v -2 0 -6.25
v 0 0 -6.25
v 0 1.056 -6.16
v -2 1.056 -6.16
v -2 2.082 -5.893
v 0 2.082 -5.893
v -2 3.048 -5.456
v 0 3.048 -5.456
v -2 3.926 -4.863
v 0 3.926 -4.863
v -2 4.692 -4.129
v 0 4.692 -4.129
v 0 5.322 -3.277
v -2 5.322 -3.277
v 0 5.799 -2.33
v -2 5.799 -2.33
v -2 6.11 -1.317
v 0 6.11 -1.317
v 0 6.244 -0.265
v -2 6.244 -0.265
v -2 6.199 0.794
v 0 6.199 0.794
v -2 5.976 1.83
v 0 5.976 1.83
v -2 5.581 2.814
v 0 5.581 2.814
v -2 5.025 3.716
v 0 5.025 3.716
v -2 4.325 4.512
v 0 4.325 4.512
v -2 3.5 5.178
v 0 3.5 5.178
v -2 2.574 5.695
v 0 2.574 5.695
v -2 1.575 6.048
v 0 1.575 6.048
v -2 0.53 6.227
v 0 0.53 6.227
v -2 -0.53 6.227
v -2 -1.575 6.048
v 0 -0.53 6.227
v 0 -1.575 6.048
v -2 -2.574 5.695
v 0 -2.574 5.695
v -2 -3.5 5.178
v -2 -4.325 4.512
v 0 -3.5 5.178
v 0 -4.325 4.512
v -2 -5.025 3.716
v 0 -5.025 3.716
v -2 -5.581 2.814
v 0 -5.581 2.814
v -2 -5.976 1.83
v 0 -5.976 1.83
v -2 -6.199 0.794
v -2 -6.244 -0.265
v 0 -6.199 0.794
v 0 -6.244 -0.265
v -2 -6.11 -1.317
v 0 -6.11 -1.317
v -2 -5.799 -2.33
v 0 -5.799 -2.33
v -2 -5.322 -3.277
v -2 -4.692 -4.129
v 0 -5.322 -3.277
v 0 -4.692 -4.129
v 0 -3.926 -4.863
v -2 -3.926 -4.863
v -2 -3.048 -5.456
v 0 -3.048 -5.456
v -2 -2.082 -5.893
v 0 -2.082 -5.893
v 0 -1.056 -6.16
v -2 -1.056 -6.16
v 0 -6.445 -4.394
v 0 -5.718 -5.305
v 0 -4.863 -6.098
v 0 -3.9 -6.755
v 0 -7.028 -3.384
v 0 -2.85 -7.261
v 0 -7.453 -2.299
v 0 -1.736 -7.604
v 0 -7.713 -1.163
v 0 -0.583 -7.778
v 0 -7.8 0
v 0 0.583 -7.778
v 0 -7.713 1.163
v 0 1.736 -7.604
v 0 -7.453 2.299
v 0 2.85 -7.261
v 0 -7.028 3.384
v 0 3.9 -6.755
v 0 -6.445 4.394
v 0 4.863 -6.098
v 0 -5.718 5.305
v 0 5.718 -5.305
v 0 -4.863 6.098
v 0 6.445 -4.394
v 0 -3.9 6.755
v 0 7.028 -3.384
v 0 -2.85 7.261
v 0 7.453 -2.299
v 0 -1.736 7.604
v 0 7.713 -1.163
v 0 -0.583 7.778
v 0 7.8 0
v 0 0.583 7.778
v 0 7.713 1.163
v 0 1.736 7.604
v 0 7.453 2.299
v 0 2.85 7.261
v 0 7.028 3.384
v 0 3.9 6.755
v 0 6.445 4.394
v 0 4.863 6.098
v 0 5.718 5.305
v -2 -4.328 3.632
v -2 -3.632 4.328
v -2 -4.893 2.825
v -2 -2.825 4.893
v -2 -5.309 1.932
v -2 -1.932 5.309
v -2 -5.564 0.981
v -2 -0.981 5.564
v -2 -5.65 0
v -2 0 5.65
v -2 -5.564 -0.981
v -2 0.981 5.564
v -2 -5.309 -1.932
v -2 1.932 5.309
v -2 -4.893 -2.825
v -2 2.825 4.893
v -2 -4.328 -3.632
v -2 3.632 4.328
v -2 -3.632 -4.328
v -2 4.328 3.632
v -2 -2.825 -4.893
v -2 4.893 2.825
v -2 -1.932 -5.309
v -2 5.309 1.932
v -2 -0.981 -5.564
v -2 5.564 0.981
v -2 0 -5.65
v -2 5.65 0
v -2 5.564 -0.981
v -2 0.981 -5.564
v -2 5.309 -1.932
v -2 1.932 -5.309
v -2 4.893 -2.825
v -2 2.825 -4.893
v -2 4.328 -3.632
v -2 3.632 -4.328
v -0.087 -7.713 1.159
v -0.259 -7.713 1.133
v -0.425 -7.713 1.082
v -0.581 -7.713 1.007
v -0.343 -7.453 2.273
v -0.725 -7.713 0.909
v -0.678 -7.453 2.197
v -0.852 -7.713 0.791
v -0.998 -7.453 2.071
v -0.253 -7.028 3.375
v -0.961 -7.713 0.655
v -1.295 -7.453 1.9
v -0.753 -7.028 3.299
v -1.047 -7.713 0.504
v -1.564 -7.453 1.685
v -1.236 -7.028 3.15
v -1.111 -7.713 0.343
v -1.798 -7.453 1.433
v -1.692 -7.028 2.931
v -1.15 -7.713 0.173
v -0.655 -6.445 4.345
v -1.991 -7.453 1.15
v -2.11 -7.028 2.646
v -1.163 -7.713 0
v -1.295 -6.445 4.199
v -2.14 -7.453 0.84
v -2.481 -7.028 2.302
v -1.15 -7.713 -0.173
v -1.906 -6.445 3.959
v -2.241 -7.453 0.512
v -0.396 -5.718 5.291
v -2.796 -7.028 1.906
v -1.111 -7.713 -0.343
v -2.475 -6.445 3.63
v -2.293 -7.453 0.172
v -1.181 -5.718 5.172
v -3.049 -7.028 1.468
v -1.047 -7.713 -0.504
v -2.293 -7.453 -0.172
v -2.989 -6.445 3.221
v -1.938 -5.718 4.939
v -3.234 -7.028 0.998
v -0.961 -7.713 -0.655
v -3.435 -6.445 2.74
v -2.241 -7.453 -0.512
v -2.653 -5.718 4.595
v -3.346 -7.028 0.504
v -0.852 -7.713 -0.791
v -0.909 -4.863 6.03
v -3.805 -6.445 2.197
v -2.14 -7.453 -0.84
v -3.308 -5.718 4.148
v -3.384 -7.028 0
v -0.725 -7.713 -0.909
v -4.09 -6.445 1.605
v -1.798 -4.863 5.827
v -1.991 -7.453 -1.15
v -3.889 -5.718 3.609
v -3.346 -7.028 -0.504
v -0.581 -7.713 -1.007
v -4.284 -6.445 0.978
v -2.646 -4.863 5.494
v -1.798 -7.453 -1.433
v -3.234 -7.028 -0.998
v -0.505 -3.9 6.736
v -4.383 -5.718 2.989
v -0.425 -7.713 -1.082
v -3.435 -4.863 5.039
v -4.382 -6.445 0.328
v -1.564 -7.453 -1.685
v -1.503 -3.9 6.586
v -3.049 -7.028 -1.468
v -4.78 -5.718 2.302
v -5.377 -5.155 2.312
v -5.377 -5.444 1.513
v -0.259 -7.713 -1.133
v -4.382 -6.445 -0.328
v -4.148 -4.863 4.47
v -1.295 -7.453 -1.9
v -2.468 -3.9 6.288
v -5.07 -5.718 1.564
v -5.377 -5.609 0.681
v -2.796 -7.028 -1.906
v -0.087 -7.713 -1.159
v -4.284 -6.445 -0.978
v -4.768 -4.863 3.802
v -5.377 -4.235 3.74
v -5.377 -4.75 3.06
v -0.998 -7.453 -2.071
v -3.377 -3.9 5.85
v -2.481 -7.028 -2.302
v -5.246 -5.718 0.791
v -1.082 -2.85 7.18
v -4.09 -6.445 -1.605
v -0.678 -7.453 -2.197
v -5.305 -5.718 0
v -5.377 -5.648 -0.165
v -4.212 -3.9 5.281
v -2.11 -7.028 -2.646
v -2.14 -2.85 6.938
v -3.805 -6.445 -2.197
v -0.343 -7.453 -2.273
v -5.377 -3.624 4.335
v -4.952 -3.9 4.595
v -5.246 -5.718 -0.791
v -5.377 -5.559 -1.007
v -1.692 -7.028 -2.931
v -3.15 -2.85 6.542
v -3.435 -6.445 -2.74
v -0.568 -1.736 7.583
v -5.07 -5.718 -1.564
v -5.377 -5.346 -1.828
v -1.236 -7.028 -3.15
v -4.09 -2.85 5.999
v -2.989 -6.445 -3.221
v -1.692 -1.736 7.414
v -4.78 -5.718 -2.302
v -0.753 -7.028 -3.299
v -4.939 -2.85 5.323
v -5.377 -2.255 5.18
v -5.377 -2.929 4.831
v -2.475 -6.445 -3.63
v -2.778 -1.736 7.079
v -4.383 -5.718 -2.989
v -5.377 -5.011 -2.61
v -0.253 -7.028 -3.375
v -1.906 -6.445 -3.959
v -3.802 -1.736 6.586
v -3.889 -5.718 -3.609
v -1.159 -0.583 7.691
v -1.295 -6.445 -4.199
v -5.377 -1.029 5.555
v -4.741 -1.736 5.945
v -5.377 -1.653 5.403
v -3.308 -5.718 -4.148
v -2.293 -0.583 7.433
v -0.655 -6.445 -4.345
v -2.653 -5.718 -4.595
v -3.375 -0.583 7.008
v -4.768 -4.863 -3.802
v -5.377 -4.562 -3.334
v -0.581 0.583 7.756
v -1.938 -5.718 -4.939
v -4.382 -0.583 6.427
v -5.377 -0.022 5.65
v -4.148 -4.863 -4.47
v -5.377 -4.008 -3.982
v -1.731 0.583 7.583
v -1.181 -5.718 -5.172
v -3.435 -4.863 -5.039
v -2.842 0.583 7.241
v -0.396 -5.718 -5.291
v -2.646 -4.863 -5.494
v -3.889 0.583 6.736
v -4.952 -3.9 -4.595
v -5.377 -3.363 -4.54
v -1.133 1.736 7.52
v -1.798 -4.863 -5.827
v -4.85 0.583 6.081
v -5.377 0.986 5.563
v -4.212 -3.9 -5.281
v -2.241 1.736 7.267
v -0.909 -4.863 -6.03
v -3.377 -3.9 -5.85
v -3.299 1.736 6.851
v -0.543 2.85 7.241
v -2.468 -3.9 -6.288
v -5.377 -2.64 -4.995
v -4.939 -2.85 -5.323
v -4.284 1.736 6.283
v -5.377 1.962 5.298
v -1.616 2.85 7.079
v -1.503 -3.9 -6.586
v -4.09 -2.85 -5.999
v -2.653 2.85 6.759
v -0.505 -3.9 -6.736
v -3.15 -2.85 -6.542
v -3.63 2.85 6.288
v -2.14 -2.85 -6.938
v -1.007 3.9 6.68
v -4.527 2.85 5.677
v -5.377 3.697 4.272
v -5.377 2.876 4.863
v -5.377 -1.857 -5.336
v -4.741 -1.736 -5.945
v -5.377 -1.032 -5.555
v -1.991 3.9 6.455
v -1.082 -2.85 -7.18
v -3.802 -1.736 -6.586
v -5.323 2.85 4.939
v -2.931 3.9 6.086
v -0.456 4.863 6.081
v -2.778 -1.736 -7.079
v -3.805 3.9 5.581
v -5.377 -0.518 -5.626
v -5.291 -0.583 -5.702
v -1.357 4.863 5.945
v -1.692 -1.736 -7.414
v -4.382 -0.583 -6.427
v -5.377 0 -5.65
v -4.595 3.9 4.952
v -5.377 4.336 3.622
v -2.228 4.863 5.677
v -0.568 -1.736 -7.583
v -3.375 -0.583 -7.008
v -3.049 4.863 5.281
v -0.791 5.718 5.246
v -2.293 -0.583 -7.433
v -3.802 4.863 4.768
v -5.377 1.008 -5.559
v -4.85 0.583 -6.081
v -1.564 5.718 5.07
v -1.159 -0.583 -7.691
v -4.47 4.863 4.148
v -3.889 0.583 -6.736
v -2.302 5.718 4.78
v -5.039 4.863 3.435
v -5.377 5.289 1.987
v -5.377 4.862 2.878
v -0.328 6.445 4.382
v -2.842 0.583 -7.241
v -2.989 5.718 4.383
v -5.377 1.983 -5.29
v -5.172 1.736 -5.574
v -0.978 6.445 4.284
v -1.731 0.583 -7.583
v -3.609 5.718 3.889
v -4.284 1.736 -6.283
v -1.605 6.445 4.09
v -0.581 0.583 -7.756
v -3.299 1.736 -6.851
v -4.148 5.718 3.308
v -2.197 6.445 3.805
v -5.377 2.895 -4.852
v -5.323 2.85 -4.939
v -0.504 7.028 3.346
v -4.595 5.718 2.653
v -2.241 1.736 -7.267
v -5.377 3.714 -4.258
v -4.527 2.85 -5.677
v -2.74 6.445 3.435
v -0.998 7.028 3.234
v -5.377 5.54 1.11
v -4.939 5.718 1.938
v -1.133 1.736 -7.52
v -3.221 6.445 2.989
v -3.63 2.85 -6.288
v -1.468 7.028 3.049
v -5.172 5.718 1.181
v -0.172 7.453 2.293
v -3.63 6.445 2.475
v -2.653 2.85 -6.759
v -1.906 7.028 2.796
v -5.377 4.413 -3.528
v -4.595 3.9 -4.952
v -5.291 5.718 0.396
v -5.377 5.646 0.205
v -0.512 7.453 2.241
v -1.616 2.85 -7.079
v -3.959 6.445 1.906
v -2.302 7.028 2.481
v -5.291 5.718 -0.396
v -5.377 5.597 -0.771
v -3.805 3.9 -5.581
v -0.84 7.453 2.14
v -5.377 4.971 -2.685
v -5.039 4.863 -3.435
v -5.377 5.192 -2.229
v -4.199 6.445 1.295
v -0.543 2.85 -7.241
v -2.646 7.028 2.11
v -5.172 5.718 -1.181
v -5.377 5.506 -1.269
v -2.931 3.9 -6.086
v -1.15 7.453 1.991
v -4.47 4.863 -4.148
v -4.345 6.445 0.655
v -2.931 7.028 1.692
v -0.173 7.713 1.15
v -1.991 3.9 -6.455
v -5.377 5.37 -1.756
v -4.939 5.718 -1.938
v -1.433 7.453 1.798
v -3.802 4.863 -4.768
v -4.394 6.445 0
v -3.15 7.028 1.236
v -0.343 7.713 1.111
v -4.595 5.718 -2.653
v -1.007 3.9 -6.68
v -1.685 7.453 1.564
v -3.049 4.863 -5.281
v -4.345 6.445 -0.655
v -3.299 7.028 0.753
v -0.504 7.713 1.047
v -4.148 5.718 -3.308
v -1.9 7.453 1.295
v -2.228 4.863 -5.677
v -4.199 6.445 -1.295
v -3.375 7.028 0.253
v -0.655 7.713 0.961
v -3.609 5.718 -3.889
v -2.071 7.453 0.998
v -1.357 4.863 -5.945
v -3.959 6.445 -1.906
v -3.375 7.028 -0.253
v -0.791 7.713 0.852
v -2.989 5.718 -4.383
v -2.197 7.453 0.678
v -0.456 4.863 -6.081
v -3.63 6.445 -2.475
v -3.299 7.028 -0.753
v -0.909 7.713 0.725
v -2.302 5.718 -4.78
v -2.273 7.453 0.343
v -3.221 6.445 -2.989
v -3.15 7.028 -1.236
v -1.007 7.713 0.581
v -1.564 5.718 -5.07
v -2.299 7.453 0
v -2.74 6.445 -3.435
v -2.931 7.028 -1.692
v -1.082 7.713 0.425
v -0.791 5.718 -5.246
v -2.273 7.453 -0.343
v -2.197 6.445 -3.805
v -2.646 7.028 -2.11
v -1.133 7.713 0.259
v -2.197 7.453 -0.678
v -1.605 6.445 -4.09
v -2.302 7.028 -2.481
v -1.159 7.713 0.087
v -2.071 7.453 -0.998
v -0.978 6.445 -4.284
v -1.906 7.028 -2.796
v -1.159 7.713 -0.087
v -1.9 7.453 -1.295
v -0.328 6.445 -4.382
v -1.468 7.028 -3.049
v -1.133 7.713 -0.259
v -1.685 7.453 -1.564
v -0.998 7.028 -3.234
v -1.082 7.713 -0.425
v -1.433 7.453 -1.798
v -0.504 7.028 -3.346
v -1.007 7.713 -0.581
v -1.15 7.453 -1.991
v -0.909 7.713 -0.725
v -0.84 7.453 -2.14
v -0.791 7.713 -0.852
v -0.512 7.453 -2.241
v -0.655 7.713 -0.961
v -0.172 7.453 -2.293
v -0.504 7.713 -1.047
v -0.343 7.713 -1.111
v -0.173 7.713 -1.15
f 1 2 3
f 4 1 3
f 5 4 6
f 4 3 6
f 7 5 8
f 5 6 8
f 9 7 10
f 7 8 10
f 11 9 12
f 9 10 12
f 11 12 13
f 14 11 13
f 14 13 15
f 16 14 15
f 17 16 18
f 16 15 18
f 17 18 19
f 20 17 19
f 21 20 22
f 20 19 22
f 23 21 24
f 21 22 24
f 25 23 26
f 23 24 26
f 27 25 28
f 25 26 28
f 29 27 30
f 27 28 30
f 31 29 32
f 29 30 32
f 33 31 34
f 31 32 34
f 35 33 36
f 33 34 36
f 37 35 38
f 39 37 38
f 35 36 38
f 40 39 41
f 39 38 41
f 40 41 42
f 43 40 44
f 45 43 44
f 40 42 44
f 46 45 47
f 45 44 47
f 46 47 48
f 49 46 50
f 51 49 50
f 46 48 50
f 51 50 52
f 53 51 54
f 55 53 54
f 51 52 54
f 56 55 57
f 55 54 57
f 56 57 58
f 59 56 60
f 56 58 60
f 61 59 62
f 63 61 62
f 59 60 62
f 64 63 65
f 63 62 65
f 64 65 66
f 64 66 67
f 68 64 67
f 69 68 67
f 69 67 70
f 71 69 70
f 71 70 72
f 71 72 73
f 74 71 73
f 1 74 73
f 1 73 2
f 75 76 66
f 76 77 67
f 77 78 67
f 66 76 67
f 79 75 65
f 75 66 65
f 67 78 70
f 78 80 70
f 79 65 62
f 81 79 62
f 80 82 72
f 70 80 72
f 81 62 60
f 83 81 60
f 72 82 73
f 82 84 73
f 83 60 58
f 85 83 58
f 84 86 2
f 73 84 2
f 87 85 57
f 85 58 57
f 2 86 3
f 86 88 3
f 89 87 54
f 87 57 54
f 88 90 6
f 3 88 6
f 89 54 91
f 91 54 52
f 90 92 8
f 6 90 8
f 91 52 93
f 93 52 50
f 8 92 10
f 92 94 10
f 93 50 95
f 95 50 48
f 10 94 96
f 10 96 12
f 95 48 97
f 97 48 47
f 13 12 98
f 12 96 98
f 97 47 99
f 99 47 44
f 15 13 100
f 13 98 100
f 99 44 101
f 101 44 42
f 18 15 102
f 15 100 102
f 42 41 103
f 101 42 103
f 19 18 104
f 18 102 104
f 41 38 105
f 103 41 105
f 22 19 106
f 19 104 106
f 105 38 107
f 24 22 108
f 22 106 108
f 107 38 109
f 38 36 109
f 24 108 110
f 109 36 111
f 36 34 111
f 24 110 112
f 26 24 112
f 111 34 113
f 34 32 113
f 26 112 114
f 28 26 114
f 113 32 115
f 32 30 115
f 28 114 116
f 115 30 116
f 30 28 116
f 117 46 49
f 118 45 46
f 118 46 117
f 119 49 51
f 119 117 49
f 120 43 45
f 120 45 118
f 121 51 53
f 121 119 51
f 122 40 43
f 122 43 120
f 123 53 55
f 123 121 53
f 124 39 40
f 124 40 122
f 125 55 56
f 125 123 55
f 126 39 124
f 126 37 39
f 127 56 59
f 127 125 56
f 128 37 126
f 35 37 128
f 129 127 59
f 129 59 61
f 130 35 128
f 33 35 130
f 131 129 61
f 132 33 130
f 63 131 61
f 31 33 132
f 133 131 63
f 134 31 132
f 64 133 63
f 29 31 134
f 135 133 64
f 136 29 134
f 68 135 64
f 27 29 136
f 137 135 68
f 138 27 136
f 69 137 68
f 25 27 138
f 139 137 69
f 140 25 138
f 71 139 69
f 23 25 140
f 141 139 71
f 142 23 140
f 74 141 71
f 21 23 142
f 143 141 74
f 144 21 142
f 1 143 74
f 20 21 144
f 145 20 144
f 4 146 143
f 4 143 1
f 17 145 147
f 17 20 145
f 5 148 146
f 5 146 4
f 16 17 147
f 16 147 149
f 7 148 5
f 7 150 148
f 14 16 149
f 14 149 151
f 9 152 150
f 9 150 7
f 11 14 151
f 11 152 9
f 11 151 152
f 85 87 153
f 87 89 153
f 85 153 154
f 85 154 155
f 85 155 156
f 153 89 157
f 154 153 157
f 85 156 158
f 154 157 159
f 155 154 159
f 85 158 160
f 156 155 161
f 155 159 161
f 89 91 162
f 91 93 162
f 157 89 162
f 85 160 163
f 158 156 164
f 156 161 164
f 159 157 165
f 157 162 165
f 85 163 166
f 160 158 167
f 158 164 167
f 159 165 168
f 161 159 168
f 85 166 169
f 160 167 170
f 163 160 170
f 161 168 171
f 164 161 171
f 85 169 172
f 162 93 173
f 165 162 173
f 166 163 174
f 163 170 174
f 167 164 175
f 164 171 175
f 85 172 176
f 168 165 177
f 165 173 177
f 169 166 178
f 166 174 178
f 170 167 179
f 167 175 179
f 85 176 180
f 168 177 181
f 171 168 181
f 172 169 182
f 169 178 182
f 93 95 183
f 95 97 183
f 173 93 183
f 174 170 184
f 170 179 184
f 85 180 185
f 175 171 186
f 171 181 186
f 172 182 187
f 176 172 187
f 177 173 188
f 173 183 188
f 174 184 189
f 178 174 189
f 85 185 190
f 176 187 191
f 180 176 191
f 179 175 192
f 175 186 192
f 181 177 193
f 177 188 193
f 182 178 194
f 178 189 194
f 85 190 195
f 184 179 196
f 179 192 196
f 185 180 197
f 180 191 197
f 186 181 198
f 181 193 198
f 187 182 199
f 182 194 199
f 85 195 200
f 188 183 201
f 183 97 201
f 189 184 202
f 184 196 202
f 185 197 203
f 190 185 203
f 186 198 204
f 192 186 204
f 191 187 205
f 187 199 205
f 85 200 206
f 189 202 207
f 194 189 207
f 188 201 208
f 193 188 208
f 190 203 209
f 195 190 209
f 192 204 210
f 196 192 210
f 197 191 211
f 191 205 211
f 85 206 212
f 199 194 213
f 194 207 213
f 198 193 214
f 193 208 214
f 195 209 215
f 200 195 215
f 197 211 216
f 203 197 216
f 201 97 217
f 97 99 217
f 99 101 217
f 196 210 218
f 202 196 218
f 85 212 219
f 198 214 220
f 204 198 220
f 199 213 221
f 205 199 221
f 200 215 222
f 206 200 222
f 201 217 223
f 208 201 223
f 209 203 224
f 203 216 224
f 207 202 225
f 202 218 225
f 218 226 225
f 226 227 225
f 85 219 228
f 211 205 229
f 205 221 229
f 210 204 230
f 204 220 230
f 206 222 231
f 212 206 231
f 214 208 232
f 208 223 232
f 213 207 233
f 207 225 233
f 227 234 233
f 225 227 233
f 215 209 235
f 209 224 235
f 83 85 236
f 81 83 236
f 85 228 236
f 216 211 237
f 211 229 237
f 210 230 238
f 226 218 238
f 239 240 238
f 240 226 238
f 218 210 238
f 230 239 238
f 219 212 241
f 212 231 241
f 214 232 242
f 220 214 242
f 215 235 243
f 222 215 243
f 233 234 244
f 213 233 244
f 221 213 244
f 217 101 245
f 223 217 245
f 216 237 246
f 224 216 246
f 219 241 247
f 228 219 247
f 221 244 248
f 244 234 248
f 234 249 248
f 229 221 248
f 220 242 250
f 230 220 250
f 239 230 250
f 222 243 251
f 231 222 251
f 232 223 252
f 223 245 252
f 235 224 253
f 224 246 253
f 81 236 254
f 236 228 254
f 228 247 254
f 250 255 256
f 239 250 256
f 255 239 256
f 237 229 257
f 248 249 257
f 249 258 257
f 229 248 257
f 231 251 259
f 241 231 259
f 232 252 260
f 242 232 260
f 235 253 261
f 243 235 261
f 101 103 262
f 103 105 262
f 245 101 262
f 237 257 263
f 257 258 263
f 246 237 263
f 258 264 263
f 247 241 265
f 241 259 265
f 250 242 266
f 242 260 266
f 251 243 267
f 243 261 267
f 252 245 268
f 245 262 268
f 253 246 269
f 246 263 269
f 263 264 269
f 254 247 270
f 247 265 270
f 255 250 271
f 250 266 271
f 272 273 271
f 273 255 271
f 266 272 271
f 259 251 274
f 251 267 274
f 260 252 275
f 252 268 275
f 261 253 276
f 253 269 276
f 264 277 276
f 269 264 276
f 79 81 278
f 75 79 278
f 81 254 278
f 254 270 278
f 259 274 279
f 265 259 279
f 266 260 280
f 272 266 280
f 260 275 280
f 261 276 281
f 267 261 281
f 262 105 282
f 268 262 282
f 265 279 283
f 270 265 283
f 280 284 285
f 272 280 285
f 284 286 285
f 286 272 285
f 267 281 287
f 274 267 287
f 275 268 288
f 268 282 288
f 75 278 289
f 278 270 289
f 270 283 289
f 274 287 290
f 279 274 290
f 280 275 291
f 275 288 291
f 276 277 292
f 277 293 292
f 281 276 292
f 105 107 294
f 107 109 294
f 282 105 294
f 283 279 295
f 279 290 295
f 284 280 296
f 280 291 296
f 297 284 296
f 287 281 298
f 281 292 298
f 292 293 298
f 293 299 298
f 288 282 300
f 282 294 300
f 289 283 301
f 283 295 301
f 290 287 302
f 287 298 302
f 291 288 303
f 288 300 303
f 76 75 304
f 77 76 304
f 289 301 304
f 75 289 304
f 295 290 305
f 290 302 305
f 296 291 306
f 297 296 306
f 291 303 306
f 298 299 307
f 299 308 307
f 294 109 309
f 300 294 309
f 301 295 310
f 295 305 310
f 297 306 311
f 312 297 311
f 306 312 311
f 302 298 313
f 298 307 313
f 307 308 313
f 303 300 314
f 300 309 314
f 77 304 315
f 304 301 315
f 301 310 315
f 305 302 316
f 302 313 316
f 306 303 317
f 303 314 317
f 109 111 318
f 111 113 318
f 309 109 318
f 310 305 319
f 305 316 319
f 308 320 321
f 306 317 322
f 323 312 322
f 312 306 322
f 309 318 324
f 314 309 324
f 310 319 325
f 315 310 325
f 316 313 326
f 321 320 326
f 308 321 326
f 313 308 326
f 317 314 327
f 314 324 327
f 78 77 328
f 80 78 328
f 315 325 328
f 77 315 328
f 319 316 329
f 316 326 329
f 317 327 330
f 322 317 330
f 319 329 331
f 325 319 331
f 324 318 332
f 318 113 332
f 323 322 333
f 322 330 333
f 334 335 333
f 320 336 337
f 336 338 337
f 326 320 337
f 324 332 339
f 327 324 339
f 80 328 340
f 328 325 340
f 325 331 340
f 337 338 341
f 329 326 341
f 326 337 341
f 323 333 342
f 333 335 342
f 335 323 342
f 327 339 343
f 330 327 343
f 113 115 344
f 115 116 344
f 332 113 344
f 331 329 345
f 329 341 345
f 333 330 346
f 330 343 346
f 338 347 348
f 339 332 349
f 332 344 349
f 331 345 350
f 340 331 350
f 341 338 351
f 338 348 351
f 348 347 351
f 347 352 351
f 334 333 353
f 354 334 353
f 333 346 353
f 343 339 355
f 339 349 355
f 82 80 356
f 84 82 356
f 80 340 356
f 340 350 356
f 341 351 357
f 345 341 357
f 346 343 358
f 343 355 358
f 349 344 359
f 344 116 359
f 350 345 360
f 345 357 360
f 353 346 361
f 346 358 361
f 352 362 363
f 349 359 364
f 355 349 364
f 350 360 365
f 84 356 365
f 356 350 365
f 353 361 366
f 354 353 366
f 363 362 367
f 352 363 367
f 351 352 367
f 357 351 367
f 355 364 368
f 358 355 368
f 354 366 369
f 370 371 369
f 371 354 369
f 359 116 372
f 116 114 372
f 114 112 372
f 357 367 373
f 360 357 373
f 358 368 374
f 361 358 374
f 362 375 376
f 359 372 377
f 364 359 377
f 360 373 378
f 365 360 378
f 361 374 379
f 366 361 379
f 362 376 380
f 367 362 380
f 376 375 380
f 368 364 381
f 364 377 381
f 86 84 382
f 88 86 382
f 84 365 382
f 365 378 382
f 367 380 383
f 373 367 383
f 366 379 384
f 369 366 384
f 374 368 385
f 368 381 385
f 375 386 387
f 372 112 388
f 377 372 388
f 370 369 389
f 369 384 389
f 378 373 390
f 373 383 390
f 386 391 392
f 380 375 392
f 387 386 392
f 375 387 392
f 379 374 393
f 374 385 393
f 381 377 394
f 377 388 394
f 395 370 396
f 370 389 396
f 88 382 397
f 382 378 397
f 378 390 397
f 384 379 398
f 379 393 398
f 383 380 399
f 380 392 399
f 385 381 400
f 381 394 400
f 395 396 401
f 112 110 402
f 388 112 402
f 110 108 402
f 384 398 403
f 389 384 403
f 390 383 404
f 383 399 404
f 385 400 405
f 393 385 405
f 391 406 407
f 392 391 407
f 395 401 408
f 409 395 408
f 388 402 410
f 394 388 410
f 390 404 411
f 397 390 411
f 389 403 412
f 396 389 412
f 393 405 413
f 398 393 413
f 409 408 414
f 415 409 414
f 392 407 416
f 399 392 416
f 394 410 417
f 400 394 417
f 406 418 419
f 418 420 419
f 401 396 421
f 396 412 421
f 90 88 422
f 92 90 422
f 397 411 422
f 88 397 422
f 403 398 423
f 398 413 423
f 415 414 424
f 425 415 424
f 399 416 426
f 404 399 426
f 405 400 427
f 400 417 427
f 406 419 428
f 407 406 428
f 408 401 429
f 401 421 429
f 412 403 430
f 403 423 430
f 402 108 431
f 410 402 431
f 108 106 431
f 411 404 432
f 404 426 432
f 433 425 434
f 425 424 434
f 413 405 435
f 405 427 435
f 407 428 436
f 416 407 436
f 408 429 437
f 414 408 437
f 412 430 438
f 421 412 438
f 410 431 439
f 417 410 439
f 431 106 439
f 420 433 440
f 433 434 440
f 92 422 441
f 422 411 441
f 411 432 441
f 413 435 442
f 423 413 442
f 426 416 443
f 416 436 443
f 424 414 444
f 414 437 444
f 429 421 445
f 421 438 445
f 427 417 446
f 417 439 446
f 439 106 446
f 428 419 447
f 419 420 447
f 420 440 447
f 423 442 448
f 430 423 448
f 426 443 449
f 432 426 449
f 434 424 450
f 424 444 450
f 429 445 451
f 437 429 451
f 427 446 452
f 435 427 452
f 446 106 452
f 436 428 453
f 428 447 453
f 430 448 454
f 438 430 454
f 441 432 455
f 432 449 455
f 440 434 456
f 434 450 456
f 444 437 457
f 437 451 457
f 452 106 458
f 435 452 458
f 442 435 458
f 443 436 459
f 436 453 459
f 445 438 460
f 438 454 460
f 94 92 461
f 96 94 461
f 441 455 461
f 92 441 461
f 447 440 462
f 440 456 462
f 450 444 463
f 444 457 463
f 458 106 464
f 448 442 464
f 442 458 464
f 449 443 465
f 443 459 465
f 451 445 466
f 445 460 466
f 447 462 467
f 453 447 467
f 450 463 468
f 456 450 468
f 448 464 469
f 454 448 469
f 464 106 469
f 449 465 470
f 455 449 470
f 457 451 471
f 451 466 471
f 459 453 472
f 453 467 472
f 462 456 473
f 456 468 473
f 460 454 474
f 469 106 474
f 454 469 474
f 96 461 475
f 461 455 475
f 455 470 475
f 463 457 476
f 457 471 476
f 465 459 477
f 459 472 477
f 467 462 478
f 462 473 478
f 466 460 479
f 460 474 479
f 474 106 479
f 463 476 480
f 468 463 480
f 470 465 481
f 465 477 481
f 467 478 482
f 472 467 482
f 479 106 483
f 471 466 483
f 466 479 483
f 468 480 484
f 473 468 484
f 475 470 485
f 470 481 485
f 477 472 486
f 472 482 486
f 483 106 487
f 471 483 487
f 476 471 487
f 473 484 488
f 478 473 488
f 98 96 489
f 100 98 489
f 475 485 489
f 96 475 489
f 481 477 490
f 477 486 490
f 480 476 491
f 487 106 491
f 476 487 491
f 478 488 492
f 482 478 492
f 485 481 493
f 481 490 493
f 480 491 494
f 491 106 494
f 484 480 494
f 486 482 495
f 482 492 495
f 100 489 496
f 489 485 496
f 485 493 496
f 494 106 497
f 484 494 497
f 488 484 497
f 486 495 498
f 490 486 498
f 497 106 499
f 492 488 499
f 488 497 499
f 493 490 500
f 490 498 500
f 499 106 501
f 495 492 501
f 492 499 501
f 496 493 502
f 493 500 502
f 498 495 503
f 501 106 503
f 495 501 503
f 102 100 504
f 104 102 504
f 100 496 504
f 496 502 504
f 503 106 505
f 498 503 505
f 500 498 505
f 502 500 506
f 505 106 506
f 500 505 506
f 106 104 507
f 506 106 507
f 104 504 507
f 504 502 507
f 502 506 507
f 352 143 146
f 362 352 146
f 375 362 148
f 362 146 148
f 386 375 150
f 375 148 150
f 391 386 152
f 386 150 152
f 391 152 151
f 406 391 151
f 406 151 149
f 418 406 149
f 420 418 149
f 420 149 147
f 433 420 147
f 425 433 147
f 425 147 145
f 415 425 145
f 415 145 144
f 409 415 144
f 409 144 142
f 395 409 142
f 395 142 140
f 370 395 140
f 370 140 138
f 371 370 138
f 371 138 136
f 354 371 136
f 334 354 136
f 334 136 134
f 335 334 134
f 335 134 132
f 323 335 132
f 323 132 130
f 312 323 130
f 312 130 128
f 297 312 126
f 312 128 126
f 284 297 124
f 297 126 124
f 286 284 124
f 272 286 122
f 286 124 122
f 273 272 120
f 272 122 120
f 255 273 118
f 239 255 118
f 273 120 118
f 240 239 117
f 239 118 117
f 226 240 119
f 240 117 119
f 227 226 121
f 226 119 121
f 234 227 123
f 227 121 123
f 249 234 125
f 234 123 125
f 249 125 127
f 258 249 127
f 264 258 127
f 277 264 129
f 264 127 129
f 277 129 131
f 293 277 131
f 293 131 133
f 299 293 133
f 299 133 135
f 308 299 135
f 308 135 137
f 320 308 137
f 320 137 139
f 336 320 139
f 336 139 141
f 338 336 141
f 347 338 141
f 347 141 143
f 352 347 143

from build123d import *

# Parameters (mm, degrees)
REVOLVE_1_ANGLE          = 180
CUT_EXTRUDE_3_DEPTH      = 14.509996299
CUT_EXTRUDE_3_DEPTH_BACK = 14.509996299
SKETCH_5_W               = 6
SKETCH_5_H               = 20
SKETCH_11_R              = 5.65
CUT_EXTRUDE_7_DEPTH      = 13.325988804
SKETCH_12_R              = 6.25
CUT_EXTRUDE_8_DEPTH      = 2


with BuildPart() as part:
    # 草图1 → 旋转1 (revolve)
    with BuildSketch(Plane(origin=(0, 0, 0), x_dir=(0, 0, -1), z_dir=(1, 0, 0))):
        with BuildLine():
            Line((0, 7.8), (0, -7.8))
            ThreePointArc((0, -7.8), (-7.8, 0), (0, 7.8))
        make_face()
    revolve(axis=Axis((0, 7.8, 0), (0, -1, 0)), revolution_arc=REVOLVE_1_ANGLE)

    # 草图5 → 切除-拉伸3 (cut, two sides: drawn at the far end of the back side and taken through both)
    with BuildSketch(Plane.XY.offset(-CUT_EXTRUDE_3_DEPTH_BACK)):
        with Locations((-8.5, 0.096965289)):
            Rectangle(SKETCH_5_W, SKETCH_5_H)
    extrude(amount=CUT_EXTRUDE_3_DEPTH + CUT_EXTRUDE_3_DEPTH_BACK, mode=Mode.SUBTRACT)

    # 草图11 → 切除-拉伸7 (cut, through all)
    with BuildSketch(Plane(origin=(0, 0, 0), x_dir=(0, 0, -1), z_dir=(1, 0, 0))):
        Circle(SKETCH_11_R)
    extrude(amount=-CUT_EXTRUDE_7_DEPTH, mode=Mode.SUBTRACT)

    # 草图12 → 切除-拉伸8 (cut)
    with BuildSketch(Plane(origin=(0, 0, 0), x_dir=(0, 0, -1), z_dir=(1, 0, 0))):
        Circle(SKETCH_12_R)
    extrude(amount=-CUT_EXTRUDE_8_DEPTH, mode=Mode.SUBTRACT)


solid = part.part
